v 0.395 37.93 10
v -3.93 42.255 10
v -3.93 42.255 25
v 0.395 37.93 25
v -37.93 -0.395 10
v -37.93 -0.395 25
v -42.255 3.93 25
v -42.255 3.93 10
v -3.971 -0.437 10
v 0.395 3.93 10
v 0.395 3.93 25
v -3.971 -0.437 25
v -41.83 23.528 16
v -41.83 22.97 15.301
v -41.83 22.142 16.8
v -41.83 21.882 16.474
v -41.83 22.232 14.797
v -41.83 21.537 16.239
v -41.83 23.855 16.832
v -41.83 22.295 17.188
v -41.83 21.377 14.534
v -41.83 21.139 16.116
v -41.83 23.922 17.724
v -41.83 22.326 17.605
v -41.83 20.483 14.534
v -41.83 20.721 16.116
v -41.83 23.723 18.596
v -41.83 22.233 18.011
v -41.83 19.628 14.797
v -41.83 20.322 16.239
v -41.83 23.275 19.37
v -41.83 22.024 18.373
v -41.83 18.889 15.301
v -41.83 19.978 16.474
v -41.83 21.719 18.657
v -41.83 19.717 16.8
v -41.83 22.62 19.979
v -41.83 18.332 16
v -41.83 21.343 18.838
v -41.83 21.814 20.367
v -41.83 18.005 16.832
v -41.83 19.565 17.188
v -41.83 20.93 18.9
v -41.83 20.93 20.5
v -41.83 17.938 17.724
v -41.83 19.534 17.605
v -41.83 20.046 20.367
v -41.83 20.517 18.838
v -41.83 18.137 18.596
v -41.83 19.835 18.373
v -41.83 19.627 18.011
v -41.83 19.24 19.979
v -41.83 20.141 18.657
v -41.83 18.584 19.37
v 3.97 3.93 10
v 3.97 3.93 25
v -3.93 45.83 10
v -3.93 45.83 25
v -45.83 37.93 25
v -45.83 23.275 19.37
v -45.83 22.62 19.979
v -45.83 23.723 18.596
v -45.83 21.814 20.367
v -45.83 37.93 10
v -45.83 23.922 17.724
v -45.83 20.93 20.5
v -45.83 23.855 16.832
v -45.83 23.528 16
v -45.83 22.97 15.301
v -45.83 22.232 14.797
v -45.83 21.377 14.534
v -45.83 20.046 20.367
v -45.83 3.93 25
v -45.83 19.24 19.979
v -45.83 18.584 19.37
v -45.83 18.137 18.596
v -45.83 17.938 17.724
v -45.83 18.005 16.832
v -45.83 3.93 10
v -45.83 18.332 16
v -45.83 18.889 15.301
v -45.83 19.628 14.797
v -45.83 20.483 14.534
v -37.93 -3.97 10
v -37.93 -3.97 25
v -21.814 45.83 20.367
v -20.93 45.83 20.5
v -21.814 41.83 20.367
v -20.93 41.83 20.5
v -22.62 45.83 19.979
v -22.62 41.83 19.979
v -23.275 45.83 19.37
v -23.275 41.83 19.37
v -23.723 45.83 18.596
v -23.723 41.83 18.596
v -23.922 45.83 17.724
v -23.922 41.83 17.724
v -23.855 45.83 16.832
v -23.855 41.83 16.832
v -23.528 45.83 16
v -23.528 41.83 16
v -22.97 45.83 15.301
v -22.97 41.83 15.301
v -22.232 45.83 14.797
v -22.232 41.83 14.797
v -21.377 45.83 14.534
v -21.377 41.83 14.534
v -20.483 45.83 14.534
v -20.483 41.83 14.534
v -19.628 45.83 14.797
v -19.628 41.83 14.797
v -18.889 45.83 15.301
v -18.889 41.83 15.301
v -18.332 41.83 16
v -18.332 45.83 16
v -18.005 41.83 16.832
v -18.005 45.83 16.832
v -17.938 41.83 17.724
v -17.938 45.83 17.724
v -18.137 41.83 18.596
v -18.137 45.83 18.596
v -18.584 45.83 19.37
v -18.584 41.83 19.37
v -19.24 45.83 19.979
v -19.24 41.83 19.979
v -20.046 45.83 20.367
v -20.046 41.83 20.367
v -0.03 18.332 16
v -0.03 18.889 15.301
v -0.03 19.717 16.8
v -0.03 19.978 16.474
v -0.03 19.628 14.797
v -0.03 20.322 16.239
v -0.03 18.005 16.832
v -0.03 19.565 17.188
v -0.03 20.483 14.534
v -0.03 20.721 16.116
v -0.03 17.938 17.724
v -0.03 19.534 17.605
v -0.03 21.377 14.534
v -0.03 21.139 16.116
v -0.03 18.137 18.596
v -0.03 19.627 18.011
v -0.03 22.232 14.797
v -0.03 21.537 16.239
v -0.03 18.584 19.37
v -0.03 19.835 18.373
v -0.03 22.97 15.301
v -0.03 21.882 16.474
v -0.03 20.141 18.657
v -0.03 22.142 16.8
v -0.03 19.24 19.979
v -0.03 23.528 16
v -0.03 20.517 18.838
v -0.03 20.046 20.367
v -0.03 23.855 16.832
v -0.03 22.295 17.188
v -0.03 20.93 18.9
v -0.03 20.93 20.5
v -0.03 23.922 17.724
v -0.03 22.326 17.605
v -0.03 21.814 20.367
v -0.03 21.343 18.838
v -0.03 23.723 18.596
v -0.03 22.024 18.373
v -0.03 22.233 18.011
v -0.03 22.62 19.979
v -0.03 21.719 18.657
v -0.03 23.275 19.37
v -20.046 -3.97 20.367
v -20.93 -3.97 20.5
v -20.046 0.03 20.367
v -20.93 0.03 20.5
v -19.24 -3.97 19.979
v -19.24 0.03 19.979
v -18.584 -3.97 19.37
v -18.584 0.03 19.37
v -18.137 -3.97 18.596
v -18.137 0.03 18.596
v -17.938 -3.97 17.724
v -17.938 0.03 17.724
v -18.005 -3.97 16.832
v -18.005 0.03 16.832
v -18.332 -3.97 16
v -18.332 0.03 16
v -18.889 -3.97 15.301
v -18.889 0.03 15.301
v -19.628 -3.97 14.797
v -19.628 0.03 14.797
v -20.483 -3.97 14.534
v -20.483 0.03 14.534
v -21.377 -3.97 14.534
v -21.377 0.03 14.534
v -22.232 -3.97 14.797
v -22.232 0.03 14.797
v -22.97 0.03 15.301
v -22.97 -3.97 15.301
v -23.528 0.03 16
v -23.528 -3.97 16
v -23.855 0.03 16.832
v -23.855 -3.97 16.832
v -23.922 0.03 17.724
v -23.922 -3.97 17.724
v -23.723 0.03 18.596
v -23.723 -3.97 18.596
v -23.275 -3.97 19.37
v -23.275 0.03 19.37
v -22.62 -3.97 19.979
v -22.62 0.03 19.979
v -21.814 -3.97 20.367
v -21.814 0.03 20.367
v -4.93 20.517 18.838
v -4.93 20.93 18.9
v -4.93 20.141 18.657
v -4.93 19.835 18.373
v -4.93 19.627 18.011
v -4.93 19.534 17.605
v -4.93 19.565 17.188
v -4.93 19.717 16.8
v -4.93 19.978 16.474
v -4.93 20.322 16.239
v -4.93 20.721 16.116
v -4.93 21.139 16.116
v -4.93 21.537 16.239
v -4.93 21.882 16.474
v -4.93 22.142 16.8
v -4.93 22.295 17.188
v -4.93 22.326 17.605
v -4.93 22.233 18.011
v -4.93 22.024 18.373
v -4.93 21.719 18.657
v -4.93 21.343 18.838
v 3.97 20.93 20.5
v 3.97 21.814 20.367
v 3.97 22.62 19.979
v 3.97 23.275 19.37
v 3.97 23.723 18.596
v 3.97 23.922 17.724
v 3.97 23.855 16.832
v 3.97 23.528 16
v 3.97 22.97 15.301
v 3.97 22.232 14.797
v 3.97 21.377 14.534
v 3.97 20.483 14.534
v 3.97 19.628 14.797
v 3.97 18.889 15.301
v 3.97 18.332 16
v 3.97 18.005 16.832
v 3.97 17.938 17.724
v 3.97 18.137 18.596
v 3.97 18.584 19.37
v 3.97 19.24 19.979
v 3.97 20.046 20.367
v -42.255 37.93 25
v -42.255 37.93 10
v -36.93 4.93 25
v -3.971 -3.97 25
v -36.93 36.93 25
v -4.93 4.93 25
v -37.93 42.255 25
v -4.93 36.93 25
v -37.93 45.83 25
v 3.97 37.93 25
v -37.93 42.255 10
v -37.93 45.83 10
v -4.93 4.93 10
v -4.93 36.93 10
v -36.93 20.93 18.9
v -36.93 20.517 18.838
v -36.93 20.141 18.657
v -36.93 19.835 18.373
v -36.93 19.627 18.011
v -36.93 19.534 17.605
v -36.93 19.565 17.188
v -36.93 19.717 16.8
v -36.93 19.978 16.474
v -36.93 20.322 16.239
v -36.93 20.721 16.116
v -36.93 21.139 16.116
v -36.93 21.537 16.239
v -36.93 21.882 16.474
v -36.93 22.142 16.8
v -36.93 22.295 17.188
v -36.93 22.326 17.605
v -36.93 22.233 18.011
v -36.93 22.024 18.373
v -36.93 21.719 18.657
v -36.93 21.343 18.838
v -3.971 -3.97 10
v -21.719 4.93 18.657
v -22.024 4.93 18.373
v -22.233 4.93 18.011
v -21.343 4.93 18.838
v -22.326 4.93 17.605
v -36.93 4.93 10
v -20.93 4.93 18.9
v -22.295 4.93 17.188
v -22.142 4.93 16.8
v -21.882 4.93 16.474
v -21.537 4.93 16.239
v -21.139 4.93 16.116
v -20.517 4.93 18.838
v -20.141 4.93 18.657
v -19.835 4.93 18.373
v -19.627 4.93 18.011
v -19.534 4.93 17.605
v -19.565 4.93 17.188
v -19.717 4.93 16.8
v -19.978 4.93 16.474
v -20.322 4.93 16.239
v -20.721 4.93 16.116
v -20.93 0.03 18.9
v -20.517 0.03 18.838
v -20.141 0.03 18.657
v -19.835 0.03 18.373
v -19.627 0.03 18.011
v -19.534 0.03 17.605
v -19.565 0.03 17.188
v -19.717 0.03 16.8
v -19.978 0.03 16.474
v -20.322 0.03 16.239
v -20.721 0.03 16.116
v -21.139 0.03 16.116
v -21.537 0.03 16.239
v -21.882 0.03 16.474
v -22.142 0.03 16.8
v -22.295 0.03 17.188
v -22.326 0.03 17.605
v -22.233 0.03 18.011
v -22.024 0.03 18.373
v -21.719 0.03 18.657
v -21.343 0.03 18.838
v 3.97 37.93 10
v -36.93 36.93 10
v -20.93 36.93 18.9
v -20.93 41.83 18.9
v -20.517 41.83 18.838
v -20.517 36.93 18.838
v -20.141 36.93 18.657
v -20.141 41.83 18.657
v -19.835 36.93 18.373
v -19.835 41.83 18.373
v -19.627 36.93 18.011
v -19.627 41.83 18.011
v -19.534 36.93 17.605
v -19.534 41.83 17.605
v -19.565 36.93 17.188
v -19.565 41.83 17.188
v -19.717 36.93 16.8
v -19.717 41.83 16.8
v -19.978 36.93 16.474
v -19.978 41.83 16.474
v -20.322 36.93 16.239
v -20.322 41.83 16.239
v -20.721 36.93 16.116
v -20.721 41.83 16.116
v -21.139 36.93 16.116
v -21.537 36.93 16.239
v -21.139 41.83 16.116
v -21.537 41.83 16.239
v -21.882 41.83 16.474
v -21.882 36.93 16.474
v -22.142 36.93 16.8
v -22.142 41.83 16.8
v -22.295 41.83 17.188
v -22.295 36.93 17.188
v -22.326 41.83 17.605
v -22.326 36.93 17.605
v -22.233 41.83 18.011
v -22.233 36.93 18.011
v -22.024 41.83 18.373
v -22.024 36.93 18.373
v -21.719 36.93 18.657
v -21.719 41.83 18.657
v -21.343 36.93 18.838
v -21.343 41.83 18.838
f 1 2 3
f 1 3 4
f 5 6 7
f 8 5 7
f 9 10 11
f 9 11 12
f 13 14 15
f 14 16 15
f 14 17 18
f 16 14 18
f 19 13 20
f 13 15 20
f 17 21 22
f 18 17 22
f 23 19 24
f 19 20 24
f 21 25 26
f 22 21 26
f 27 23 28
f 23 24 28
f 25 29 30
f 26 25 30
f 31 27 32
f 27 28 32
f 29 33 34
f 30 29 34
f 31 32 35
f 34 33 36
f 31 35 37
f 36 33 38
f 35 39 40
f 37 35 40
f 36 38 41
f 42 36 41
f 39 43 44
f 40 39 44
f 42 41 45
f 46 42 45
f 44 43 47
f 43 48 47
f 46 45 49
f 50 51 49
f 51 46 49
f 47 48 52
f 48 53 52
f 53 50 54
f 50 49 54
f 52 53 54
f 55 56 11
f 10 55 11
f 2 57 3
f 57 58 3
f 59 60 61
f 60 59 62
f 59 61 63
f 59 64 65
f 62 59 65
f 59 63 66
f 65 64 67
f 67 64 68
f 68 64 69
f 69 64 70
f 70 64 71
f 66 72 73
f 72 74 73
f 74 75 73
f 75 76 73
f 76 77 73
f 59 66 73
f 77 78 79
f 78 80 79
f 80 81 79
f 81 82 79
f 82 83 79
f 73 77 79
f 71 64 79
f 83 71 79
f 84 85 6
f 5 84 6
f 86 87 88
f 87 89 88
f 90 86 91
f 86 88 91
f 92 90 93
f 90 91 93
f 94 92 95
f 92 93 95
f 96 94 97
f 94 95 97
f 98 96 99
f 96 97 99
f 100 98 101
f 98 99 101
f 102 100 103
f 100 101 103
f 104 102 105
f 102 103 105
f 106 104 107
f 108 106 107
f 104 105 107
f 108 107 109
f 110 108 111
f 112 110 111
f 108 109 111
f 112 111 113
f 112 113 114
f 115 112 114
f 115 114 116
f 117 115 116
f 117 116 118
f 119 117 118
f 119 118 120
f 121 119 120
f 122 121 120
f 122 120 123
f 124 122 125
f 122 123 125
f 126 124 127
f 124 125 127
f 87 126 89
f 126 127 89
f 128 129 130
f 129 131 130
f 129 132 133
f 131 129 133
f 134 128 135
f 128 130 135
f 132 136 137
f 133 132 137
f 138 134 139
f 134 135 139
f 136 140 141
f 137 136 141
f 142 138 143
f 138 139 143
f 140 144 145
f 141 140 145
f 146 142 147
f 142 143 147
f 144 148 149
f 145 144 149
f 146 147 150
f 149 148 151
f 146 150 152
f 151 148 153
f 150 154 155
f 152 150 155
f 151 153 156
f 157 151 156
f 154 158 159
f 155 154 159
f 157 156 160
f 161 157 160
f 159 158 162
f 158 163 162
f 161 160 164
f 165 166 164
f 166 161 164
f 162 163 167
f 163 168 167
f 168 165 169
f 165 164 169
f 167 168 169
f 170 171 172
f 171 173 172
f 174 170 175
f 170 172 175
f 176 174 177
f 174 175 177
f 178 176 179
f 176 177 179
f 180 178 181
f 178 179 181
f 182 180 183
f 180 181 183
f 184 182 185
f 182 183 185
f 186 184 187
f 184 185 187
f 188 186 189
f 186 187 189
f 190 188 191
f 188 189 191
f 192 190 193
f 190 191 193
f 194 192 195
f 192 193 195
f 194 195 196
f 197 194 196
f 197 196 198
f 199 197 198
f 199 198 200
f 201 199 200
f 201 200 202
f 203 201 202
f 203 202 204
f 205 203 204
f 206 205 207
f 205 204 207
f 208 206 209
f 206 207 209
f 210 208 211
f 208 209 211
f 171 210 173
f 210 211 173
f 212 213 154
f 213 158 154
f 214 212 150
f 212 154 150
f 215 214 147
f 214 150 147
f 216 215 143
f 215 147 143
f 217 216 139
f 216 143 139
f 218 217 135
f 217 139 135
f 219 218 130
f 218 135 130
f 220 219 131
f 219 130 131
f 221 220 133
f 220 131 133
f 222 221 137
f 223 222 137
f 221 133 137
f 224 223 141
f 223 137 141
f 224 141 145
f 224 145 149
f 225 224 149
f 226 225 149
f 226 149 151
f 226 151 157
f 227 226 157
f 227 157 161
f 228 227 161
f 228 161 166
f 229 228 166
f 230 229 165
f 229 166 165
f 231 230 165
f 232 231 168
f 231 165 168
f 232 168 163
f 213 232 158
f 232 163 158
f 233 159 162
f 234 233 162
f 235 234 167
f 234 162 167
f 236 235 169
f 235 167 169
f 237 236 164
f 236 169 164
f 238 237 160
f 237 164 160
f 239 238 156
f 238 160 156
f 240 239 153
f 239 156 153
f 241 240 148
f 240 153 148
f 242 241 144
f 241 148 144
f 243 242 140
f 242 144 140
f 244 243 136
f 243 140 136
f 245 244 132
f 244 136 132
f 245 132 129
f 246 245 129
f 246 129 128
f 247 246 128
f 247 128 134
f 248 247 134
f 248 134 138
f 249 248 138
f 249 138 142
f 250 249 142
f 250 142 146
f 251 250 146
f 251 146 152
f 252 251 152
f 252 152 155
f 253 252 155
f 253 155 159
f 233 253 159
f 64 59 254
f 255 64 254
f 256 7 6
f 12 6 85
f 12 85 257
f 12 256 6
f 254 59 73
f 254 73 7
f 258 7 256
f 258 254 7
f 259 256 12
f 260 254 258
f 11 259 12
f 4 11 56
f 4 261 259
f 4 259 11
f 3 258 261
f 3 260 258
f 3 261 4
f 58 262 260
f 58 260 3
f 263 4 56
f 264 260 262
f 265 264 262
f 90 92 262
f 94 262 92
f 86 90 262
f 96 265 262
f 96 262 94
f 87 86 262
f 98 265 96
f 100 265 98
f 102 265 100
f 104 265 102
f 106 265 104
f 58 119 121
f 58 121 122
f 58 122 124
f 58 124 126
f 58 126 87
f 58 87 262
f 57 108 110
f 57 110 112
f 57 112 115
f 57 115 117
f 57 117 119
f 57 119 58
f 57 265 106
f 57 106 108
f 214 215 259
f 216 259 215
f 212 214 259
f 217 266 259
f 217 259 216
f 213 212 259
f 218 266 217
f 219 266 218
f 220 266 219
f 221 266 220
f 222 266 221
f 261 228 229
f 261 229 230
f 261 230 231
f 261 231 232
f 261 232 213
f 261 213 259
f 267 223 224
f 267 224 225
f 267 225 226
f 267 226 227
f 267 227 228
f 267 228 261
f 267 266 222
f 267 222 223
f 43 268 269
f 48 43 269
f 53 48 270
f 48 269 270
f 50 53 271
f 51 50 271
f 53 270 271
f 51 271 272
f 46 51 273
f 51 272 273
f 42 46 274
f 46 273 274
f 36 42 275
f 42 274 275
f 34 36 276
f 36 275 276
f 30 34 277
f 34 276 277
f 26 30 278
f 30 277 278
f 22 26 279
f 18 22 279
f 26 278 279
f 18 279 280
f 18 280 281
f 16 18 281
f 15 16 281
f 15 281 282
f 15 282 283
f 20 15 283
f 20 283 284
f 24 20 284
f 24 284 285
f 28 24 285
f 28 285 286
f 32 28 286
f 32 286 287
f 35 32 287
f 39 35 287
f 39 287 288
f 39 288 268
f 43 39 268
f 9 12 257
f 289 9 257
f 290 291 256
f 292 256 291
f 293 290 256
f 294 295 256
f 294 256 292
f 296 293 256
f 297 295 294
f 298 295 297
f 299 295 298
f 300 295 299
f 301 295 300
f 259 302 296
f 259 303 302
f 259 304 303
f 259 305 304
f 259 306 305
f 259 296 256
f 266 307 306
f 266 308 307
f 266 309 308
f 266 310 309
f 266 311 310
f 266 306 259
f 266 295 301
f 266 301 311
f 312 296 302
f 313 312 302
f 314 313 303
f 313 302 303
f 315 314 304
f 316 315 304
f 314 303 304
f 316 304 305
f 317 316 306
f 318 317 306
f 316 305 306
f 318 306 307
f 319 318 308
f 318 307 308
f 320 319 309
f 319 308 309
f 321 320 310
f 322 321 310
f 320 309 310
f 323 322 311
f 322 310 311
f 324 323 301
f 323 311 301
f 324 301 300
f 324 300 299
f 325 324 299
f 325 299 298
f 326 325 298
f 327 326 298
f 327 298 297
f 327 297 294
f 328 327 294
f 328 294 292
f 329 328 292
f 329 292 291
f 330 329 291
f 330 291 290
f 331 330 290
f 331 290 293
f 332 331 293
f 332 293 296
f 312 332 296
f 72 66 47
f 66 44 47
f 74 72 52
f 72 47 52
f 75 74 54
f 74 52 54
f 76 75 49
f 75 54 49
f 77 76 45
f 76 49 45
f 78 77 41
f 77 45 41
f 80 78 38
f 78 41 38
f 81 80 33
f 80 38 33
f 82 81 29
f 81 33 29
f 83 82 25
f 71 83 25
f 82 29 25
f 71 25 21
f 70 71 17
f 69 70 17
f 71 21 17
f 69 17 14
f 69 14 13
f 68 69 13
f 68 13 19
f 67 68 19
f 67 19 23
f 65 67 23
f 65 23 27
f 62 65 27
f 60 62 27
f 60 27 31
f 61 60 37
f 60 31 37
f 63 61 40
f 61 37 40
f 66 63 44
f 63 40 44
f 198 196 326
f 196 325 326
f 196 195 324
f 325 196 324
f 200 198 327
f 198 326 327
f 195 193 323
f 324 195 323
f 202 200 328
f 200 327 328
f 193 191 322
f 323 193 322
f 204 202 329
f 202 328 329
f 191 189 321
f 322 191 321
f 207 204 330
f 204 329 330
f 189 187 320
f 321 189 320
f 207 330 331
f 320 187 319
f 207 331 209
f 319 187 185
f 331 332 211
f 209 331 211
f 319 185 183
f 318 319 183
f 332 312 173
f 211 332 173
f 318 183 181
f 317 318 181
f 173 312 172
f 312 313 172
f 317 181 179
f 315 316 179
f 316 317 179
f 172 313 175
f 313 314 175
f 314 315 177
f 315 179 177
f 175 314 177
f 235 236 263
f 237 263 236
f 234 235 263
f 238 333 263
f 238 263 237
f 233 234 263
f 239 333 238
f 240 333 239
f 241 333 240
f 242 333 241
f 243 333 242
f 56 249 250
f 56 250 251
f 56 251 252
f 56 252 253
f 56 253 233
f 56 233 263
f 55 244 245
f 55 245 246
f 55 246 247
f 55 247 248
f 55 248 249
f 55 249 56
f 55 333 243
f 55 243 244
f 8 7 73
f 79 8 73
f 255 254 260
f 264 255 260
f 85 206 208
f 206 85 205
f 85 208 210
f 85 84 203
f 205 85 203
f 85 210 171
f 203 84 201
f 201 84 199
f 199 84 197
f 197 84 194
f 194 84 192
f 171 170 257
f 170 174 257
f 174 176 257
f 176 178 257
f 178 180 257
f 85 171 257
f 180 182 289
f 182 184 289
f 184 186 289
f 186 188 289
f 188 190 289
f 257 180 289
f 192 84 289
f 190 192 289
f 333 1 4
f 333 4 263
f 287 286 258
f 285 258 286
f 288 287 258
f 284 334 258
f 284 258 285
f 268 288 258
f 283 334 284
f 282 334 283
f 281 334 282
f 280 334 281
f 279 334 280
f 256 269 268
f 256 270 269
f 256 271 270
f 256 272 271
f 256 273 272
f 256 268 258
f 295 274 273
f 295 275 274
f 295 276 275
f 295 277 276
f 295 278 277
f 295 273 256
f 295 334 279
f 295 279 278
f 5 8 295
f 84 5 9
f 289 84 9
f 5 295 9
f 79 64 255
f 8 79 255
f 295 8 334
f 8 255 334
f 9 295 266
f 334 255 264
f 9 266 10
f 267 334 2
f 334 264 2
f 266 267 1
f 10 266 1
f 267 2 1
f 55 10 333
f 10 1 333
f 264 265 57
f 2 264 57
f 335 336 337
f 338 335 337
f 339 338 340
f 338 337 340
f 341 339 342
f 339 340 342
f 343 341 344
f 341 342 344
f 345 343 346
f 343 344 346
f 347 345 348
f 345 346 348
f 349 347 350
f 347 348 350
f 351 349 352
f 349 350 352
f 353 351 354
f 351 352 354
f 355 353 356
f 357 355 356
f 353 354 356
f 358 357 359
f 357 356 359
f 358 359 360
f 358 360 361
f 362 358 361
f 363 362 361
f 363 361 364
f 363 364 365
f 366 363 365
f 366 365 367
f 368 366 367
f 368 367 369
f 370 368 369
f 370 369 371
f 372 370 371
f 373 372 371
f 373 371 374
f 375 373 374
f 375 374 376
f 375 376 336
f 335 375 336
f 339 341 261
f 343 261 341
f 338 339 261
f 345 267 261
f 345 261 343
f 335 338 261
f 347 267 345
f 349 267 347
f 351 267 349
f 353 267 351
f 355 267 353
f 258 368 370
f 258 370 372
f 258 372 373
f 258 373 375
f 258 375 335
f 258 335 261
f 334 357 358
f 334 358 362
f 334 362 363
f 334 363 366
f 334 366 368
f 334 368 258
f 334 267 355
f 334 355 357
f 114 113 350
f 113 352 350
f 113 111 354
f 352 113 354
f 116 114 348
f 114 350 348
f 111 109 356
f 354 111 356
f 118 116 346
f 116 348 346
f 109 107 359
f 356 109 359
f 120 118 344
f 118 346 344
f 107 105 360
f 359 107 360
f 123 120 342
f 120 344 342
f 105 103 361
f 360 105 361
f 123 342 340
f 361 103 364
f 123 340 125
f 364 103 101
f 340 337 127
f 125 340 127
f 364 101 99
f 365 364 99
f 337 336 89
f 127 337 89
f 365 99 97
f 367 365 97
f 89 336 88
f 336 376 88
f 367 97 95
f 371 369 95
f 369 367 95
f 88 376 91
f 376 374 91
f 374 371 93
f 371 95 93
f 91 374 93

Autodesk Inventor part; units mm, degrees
ref_plane "YZ Plane" through (0, 0, 0) normal (1, 0, 0) x (0, 1, 0)
ref_plane "XZ Plane" through (0, 0, 0) normal (0, 1, 0) x (-1, 0, 0)
ref_plane "XY Plane" through (0, 0, 0) normal (0, 0, 1) x (1, 0, 0)
ref_plane "Work Plane5" through (0, 0, 10) normal (0, 0, 1) x (1, 0, 0)
sketch "Sketch1" plane through (0, 0, 10) normal (0, 0, 1) x (1, 0, 0)
  line L0 (-4.0299, -0.3538) -> (-2.2322, 1.4439) construction
  arc A0 (-1.4439, 2.2322) -> (-2.2322, 1.4439) centre (-0.9299, 0.9299) ccw construction
  line L1 (-1.4439, 2.2322) -> (0.3538, 4.0299) construction
  line L2 (-37.8299, 42.8299) -> (-37.8299, 37.8299) construction
  line L3 (-37.8299, 37.8299) -> (-42.9208, 37.8299) construction
  line L4 (-37.8299, 42.2137) -> (-37.8299, 45.8299) construction
  line L5 (-37.8299, 45.8299) -> (-4.0299, 45.8299) construction
  line L6 (-4.0299, 45.8299) -> (-4.0299, 42.2137) construction
  line L7 (-4.0299, 4.0299) -> (0.3538, 4.0299) projected
  circle A1 centre (-20.9299, 20.9299) radius 17.5 projected
  line L8 (-20.9299, 58.9723) -> (17.1124, 20.9299) construction
  line L9 (17.1124, 20.9299) -> (-20.9299, -17.1124) construction
  line L10 (-20.9299, -17.1124) -> (-58.9723, 20.9299) construction
  line L11 (-58.9723, 20.9299) -> (-20.9299, 58.9723) construction
  line L12 (-20.9299, 58.9723) -> (-20.9299, -17.1124) construction
  line L13 (17.1124, 20.9299) -> (-58.9723, 20.9299) construction
  line L14 (-20.9299, 58.9723) -> (32.8701, 58.9723) construction
  line L15 (-43.4299, 43.4299) -> (1.5701, 43.4299) construction
  line L16 (1.5701, 43.4299) -> (1.5701, -1.5701) construction
  line L17 (1.5701, -1.5701) -> (-43.4299, -1.5701) construction
  line L18 (-43.4299, -1.5701) -> (-43.4299, 43.4299) construction
  line L19 (-43.4299, 43.4299) -> (1.5701, -1.5701) construction
  line L20 (1.5701, 43.4299) -> (-43.4299, -1.5701) construction
  line L21 (-43.4299, 5.3876) -> (-43.4299, 36.4723)
  line L22 (-43.4299, 36.4723) -> (-36.4723, 43.4299)
  line L23 (-36.4723, 43.4299) -> (-5.3876, 43.4299)
  line L24 (-5.3876, 43.4299) -> (1.5701, 36.4723)
  line L25 (1.5701, 36.4723) -> (1.5701, 5.3876)
  line L26 (1.5701, 5.3876) -> (-5.3876, -1.5701)
  line L27 (-5.3876, -1.5701) -> (-36.4723, -1.5701)
  line L28 (-36.4723, -1.5701) -> (-43.4299, 5.3876)
  line L29 (-4.0299, 42.2137) -> (-37.8299, 42.2137) projected
  line L30 (-4.0299, -0.3538) -> (-4.0299, 4.0299) projected
  circle A2 centre (-20.9299, 20.9299) radius 1.5
  line L31 (-10.9299, 10.9299) -> (-30.9299, 10.9299) construction
  line L32 (-30.9299, 10.9299) -> (-30.9299, 30.9299) construction
  line L33 (-30.9299, 30.9299) -> (-10.9299, 30.9299) construction
  line L34 (-10.9299, 30.9299) -> (-10.9299, 10.9299) construction
  line L35 (-10.9299, 10.9299) -> (-30.9299, 30.9299) construction
  line L36 (-30.9299, 10.9299) -> (-10.9299, 30.9299) construction
  circle A3 centre (-30.9299, 30.9299) radius 1.4
  circle A4 centre (-30.9299, 10.9299) radius 1.4
  circle A5 centre (-10.9299, 10.9299) radius 1.4
  line L37 (-45.8299, 37.8299) -> (-42.0723, 37.8299) construction
  line L38 (-42.1723, 37.7299) -> (-45.8299, 37.7299)
  line L39 (-45.8299, 37.7299) -> (-45.8299, 4.1299)
  line L40 (-45.8299, 4.1299) -> (-42.1723, 4.1299)
  line L41 (-42.1723, 4.1299) -> (-42.1723, 37.7299)
  line L42 (-45.8299, 4.0299) -> (-42.0723, 4.0299) construction
  line L43 (-45.8299, 37.8299) -> (-42.0723, 37.8299) projected
  line L44 (-37.7299, 45.8299) -> (-4.1299, 45.8299)
  line L45 (-4.1299, 45.8299) -> (-4.1299, 42.1723)
  line L46 (-4.1299, 42.1723) -> (-37.7299, 42.1723)
  line L47 (-37.7299, 42.1723) -> (-37.7299, 45.8299)
  line L48 (0.4701, 37.8299) -> (0.4701, 4.0299) construction
  line L49 (0.4701, 4.0299) -> (3.9701, 4.0299) construction
  line L50 (3.9701, 37.8299) -> (3.9701, 4.0299) construction
  line L51 (0.4701, 37.8299) -> (3.9701, 37.8299) construction
  line L52 (-45.8299, -3.9701) -> (-4.0299, -3.9701) construction
  line L53 (0.3124, 37.7299) -> (3.9701, 37.7299)
  line L54 (3.9701, 37.7299) -> (3.9701, 4.1299)
  line L55 (3.9701, 4.1299) -> (0.3124, 4.1299)
  line L56 (0.3124, 4.1299) -> (0.3124, 37.7299)
  line L57 (-4.1713, -0.3538) -> (-37.7299, -0.3538)
  line L58 (-37.7299, -0.3538) -> (-37.7299, -3.9701)
  line L59 (-37.7299, -3.9701) -> (-4.1713, -3.9701)
  line L60 (-4.1713, -3.9701) -> (-4.1713, -0.3538)
  point P0 (-37.8299, 4.0299)
  dimension "d18" = 53.8
  dimension "d19" = 45
  dimension "d20" = 53.8
  dimension "d21" = 45
  dimension "d22" = 45
  dimension "d30" = 20
  dimension "d31" = 20
  dimension "d32" = 2.8
  dimension "d33" = 2.8
  dimension "d34" = 2.8
  dimension "d35" = 3
  dimension "d36" = 0.1
  dimension "d37" = 0.1
  dimension "d38" = 0.1
  dimension "d39" = 0.1
extrude "Extrusion1" add sketch "Sketch1" along normal blind 15 contours L30 L26 L57 L28 L41 L22 L46 L24 L56 L7 | L7 L26 L30 | L56 L24 L25 L26 | L26 L25 L24 L53 L54 L55 | L60 L59 L58 L57 L28 L27 L26 | L26 L27 L28 L57 | L46 L22 L29 L24 | L24 L29 L45 | L40 L39 L38 L22 L21 L28 | L28 L21 L22 L41 | L29 L22 L23 L24 | L24 L23 L22 L29 L47 L44 L45 | L47 L29 L22 | A1 | A2 | A3 | A4 | A5
sketch "Skizze4" plane through (0, 0, 25) normal (0, 0, 1) x (1, 0, 0)
  line L0 (-37.7299, 42.1723) -> (-42.1723, 37.7299) projected
  line L1 (-42.1723, 37.7299) -> (-45.8299, 37.7299) projected
  line L2 (-45.8299, 37.7299) -> (-45.8299, 4.1299) construction
  line L3 (-45.8299, 4.1299) -> (-42.1723, 4.1299) projected
  line L4 (-42.1723, 4.1299) -> (-37.6885, -0.3538) projected
  line L5 (-37.6885, -0.3538) -> (-37.7299, -0.3538) projected
  line L6 (-37.7299, -0.3538) -> (-37.7299, -3.9701) projected
  line L7 (-37.7299, -3.9701) -> (-4.1713, -3.9701) construction
  line L8 (-4.1713, -3.9701) -> (-4.1713, -0.3538) projected
  line L9 (-4.1713, -0.3538) -> (0.3124, 4.1299) projected
  line L10 (0.3124, 4.1299) -> (3.9701, 4.1299) projected
  line L11 (3.9701, 4.1299) -> (3.9701, 37.7299) construction
  line L12 (3.9701, 37.7299) -> (0.3124, 37.7299) projected
  line L13 (0.3124, 37.7299) -> (-4.1299, 42.1723) projected
  line L14 (-4.1299, 42.1723) -> (-4.1299, 45.8299) projected
  line L15 (-4.1299, 45.8299) -> (-37.7299, 45.8299) construction
  line L16 (-37.7299, 45.8299) -> (-37.7299, 42.1723) projected
  line L17 (-37.9299, 46.0299) -> (-3.9299, 46.0299) construction
  line L18 (-3.9299, 46.0299) -> (-3.9299, 42.2551)
  line L19 (-3.9299, 42.2551) -> (0.3953, 37.9299)
  line L20 (0.3953, 37.9299) -> (4.1701, 37.9299)
  line L21 (4.1701, 37.9299) -> (4.1701, 3.9299) construction
  line L22 (4.1701, 3.9299) -> (0.3953, 3.9299)
  line L23 (0.3953, 3.9299) -> (-3.9713, -0.4367)
  line L24 (-3.9713, -0.4367) -> (-3.9713, -4.1701)
  line L25 (-3.9713, -4.1701) -> (-37.9299, -4.1701) construction
  line L26 (-37.9299, -4.1701) -> (-37.9299, -0.3953)
  line L27 (-37.9299, -0.3953) -> (-42.2551, 3.9299)
  line L28 (-42.2551, 3.9299) -> (-46.0299, 3.9299)
  line L29 (-46.0299, 3.9299) -> (-46.0299, 37.9299) construction
  line L30 (-46.0299, 37.9299) -> (-42.2551, 37.9299)
  line L31 (-42.2551, 37.9299) -> (-37.9299, 42.2551)
  line L32 (-37.9299, 42.2551) -> (-37.9299, 46.0299)
  line L33 (-45.8299, 37.7299) -> (-45.8299, 37.9299)
  line L34 (-4.1299, 45.8299) -> (-37.7299, 45.8299) projected
  line L35 (-37.7299, 45.8299) -> (-37.9299, 45.8299)
  line L36 (-4.1299, 45.8299) -> (-3.9299, 45.8299)
  line L37 (3.9701, 37.7299) -> (3.9701, 37.9299)
  line L38 (3.9701, 4.1299) -> (3.9701, 37.7299) projected
  line L39 (3.9701, 4.1299) -> (3.9701, 3.9299)
  line L40 (-4.1713, -3.9701) -> (-3.9713, -3.9701)
  line L41 (-37.7299, -3.9701) -> (-37.9299, -3.9701)
  line L42 (-45.8299, 4.1299) -> (-45.8299, 3.9299)
  point P0 (0, 0)
  dimension "d40" = 0.2
extrude "IM_offset" add sketch "Skizze4" against normal up to surface (15 mm away)
sketch "Sketch29" plane through (0, 0, 10) normal (0, 0, -1) x (-1, 0, 0)
  arc A0 (6.7299, 9.4299) -> (9.4299, 6.7299) centre (9.4299, 9.4299) ccw
  line L0 (9.4299, 6.7299) -> (32.4299, 6.7299)
  arc A1 (32.4299, 6.7299) -> (35.1299, 9.4299) centre (32.4299, 9.4299) ccw
  line L1 (35.1299, 9.4299) -> (35.1299, 32.4299)
  arc A2 (35.1299, 32.4299) -> (32.4299, 35.1299) centre (32.4299, 32.4299) ccw
  line L2 (32.4299, 35.1299) -> (9.4299, 35.1299)
  arc A3 (9.4299, 35.1299) -> (6.7299, 32.4299) centre (9.4299, 32.4299) ccw
  line L3 (6.7299, 32.4299) -> (6.7299, 9.4299)
  line L4 (36.9299, 4.9299) -> (4.9299, 4.9299)
  line L5 (4.9299, 4.9299) -> (4.9299, 36.9299)
  line L6 (4.9299, 36.9299) -> (36.9299, 36.9299)
  line L7 (36.9299, 36.9299) -> (36.9299, 4.9299)
  line L8 (36.9299, 4.9299) -> (4.9299, 36.9299) construction
  line L9 (4.9299, 4.9299) -> (36.9299, 36.9299) construction
  point P0 (0, 0)
  point P1 (20.9299, 20.9299)
  dimension "d187" = 32
  dimension "d188" = 32
extrude "Extrusion23" cut sketch "Sketch29" against normal through all contours L3 A3 L2 A2 L1 A1 L0 A0 | L4 L5 L6 L7
sketch "Sketch30" plane through (-45.8299, 0, 10) normal (-1, 0, 0) x (0, 0, 1)
  line L0 (35.0799, 45.8299) -> (6.8799, 45.8299)
  line L1 (0, 3.9299) -> (0, 37.9299) projected
  line L2 (15, 3.9299) -> (0, 3.9299) projected
  line L3 (15, 37.9299) -> (15, 3.9299) projected
  line L4 (15, 37.9299) -> (0, 37.9299) projected
  circle A0 centre (7.5, 20.9299) radius 1.7201
  point P0 (-10, 0)
ref_plane "Arbeitsebene7" through (-20.9299, 3.9299, 10) normal (-1, 0, 0) x (0, 0, 1)
ref_plane "Arbeitsebene8" through (-37.9299, 20.9299, 10) normal (0, 1, 0) x (1, 0, 0)
ref_plane "Arbeitsebene9" through (-20.9299, 3.9299, 10) normal (-1, 0, 0) x (0, 0, 1)
ref_plane "Arbeitsebene10" through (-37.9299, 20.9299, 10) normal (0, -1, 0) x (1, 0, 0)
hole "Bohrung2" at (-45.8299, 20.9299, 17.5) direction (1, 0, 0) diameter 2.8 end through all counterbore diameter 6 counterbore depth 4
pattern_circular "Runde Anordnung2" count 4 over 360 about axis through (-20.9299, 20.9299, 10) along (0, 0, 1) of "Bohrung2"
ref_plane "Arbeitsebene11" through (-20.9299, 3.9299, 10) normal (1, 0, 0) x (0, 0, -1)
ref_plane "Arbeitsebene12" through (-37.9299, 20.9299, 10) normal (0, 1, 0) x (1, 0, 0)
properties part number "30_Cube_Z_Focus_MGN_NEMA_Motorsupport_centered"
